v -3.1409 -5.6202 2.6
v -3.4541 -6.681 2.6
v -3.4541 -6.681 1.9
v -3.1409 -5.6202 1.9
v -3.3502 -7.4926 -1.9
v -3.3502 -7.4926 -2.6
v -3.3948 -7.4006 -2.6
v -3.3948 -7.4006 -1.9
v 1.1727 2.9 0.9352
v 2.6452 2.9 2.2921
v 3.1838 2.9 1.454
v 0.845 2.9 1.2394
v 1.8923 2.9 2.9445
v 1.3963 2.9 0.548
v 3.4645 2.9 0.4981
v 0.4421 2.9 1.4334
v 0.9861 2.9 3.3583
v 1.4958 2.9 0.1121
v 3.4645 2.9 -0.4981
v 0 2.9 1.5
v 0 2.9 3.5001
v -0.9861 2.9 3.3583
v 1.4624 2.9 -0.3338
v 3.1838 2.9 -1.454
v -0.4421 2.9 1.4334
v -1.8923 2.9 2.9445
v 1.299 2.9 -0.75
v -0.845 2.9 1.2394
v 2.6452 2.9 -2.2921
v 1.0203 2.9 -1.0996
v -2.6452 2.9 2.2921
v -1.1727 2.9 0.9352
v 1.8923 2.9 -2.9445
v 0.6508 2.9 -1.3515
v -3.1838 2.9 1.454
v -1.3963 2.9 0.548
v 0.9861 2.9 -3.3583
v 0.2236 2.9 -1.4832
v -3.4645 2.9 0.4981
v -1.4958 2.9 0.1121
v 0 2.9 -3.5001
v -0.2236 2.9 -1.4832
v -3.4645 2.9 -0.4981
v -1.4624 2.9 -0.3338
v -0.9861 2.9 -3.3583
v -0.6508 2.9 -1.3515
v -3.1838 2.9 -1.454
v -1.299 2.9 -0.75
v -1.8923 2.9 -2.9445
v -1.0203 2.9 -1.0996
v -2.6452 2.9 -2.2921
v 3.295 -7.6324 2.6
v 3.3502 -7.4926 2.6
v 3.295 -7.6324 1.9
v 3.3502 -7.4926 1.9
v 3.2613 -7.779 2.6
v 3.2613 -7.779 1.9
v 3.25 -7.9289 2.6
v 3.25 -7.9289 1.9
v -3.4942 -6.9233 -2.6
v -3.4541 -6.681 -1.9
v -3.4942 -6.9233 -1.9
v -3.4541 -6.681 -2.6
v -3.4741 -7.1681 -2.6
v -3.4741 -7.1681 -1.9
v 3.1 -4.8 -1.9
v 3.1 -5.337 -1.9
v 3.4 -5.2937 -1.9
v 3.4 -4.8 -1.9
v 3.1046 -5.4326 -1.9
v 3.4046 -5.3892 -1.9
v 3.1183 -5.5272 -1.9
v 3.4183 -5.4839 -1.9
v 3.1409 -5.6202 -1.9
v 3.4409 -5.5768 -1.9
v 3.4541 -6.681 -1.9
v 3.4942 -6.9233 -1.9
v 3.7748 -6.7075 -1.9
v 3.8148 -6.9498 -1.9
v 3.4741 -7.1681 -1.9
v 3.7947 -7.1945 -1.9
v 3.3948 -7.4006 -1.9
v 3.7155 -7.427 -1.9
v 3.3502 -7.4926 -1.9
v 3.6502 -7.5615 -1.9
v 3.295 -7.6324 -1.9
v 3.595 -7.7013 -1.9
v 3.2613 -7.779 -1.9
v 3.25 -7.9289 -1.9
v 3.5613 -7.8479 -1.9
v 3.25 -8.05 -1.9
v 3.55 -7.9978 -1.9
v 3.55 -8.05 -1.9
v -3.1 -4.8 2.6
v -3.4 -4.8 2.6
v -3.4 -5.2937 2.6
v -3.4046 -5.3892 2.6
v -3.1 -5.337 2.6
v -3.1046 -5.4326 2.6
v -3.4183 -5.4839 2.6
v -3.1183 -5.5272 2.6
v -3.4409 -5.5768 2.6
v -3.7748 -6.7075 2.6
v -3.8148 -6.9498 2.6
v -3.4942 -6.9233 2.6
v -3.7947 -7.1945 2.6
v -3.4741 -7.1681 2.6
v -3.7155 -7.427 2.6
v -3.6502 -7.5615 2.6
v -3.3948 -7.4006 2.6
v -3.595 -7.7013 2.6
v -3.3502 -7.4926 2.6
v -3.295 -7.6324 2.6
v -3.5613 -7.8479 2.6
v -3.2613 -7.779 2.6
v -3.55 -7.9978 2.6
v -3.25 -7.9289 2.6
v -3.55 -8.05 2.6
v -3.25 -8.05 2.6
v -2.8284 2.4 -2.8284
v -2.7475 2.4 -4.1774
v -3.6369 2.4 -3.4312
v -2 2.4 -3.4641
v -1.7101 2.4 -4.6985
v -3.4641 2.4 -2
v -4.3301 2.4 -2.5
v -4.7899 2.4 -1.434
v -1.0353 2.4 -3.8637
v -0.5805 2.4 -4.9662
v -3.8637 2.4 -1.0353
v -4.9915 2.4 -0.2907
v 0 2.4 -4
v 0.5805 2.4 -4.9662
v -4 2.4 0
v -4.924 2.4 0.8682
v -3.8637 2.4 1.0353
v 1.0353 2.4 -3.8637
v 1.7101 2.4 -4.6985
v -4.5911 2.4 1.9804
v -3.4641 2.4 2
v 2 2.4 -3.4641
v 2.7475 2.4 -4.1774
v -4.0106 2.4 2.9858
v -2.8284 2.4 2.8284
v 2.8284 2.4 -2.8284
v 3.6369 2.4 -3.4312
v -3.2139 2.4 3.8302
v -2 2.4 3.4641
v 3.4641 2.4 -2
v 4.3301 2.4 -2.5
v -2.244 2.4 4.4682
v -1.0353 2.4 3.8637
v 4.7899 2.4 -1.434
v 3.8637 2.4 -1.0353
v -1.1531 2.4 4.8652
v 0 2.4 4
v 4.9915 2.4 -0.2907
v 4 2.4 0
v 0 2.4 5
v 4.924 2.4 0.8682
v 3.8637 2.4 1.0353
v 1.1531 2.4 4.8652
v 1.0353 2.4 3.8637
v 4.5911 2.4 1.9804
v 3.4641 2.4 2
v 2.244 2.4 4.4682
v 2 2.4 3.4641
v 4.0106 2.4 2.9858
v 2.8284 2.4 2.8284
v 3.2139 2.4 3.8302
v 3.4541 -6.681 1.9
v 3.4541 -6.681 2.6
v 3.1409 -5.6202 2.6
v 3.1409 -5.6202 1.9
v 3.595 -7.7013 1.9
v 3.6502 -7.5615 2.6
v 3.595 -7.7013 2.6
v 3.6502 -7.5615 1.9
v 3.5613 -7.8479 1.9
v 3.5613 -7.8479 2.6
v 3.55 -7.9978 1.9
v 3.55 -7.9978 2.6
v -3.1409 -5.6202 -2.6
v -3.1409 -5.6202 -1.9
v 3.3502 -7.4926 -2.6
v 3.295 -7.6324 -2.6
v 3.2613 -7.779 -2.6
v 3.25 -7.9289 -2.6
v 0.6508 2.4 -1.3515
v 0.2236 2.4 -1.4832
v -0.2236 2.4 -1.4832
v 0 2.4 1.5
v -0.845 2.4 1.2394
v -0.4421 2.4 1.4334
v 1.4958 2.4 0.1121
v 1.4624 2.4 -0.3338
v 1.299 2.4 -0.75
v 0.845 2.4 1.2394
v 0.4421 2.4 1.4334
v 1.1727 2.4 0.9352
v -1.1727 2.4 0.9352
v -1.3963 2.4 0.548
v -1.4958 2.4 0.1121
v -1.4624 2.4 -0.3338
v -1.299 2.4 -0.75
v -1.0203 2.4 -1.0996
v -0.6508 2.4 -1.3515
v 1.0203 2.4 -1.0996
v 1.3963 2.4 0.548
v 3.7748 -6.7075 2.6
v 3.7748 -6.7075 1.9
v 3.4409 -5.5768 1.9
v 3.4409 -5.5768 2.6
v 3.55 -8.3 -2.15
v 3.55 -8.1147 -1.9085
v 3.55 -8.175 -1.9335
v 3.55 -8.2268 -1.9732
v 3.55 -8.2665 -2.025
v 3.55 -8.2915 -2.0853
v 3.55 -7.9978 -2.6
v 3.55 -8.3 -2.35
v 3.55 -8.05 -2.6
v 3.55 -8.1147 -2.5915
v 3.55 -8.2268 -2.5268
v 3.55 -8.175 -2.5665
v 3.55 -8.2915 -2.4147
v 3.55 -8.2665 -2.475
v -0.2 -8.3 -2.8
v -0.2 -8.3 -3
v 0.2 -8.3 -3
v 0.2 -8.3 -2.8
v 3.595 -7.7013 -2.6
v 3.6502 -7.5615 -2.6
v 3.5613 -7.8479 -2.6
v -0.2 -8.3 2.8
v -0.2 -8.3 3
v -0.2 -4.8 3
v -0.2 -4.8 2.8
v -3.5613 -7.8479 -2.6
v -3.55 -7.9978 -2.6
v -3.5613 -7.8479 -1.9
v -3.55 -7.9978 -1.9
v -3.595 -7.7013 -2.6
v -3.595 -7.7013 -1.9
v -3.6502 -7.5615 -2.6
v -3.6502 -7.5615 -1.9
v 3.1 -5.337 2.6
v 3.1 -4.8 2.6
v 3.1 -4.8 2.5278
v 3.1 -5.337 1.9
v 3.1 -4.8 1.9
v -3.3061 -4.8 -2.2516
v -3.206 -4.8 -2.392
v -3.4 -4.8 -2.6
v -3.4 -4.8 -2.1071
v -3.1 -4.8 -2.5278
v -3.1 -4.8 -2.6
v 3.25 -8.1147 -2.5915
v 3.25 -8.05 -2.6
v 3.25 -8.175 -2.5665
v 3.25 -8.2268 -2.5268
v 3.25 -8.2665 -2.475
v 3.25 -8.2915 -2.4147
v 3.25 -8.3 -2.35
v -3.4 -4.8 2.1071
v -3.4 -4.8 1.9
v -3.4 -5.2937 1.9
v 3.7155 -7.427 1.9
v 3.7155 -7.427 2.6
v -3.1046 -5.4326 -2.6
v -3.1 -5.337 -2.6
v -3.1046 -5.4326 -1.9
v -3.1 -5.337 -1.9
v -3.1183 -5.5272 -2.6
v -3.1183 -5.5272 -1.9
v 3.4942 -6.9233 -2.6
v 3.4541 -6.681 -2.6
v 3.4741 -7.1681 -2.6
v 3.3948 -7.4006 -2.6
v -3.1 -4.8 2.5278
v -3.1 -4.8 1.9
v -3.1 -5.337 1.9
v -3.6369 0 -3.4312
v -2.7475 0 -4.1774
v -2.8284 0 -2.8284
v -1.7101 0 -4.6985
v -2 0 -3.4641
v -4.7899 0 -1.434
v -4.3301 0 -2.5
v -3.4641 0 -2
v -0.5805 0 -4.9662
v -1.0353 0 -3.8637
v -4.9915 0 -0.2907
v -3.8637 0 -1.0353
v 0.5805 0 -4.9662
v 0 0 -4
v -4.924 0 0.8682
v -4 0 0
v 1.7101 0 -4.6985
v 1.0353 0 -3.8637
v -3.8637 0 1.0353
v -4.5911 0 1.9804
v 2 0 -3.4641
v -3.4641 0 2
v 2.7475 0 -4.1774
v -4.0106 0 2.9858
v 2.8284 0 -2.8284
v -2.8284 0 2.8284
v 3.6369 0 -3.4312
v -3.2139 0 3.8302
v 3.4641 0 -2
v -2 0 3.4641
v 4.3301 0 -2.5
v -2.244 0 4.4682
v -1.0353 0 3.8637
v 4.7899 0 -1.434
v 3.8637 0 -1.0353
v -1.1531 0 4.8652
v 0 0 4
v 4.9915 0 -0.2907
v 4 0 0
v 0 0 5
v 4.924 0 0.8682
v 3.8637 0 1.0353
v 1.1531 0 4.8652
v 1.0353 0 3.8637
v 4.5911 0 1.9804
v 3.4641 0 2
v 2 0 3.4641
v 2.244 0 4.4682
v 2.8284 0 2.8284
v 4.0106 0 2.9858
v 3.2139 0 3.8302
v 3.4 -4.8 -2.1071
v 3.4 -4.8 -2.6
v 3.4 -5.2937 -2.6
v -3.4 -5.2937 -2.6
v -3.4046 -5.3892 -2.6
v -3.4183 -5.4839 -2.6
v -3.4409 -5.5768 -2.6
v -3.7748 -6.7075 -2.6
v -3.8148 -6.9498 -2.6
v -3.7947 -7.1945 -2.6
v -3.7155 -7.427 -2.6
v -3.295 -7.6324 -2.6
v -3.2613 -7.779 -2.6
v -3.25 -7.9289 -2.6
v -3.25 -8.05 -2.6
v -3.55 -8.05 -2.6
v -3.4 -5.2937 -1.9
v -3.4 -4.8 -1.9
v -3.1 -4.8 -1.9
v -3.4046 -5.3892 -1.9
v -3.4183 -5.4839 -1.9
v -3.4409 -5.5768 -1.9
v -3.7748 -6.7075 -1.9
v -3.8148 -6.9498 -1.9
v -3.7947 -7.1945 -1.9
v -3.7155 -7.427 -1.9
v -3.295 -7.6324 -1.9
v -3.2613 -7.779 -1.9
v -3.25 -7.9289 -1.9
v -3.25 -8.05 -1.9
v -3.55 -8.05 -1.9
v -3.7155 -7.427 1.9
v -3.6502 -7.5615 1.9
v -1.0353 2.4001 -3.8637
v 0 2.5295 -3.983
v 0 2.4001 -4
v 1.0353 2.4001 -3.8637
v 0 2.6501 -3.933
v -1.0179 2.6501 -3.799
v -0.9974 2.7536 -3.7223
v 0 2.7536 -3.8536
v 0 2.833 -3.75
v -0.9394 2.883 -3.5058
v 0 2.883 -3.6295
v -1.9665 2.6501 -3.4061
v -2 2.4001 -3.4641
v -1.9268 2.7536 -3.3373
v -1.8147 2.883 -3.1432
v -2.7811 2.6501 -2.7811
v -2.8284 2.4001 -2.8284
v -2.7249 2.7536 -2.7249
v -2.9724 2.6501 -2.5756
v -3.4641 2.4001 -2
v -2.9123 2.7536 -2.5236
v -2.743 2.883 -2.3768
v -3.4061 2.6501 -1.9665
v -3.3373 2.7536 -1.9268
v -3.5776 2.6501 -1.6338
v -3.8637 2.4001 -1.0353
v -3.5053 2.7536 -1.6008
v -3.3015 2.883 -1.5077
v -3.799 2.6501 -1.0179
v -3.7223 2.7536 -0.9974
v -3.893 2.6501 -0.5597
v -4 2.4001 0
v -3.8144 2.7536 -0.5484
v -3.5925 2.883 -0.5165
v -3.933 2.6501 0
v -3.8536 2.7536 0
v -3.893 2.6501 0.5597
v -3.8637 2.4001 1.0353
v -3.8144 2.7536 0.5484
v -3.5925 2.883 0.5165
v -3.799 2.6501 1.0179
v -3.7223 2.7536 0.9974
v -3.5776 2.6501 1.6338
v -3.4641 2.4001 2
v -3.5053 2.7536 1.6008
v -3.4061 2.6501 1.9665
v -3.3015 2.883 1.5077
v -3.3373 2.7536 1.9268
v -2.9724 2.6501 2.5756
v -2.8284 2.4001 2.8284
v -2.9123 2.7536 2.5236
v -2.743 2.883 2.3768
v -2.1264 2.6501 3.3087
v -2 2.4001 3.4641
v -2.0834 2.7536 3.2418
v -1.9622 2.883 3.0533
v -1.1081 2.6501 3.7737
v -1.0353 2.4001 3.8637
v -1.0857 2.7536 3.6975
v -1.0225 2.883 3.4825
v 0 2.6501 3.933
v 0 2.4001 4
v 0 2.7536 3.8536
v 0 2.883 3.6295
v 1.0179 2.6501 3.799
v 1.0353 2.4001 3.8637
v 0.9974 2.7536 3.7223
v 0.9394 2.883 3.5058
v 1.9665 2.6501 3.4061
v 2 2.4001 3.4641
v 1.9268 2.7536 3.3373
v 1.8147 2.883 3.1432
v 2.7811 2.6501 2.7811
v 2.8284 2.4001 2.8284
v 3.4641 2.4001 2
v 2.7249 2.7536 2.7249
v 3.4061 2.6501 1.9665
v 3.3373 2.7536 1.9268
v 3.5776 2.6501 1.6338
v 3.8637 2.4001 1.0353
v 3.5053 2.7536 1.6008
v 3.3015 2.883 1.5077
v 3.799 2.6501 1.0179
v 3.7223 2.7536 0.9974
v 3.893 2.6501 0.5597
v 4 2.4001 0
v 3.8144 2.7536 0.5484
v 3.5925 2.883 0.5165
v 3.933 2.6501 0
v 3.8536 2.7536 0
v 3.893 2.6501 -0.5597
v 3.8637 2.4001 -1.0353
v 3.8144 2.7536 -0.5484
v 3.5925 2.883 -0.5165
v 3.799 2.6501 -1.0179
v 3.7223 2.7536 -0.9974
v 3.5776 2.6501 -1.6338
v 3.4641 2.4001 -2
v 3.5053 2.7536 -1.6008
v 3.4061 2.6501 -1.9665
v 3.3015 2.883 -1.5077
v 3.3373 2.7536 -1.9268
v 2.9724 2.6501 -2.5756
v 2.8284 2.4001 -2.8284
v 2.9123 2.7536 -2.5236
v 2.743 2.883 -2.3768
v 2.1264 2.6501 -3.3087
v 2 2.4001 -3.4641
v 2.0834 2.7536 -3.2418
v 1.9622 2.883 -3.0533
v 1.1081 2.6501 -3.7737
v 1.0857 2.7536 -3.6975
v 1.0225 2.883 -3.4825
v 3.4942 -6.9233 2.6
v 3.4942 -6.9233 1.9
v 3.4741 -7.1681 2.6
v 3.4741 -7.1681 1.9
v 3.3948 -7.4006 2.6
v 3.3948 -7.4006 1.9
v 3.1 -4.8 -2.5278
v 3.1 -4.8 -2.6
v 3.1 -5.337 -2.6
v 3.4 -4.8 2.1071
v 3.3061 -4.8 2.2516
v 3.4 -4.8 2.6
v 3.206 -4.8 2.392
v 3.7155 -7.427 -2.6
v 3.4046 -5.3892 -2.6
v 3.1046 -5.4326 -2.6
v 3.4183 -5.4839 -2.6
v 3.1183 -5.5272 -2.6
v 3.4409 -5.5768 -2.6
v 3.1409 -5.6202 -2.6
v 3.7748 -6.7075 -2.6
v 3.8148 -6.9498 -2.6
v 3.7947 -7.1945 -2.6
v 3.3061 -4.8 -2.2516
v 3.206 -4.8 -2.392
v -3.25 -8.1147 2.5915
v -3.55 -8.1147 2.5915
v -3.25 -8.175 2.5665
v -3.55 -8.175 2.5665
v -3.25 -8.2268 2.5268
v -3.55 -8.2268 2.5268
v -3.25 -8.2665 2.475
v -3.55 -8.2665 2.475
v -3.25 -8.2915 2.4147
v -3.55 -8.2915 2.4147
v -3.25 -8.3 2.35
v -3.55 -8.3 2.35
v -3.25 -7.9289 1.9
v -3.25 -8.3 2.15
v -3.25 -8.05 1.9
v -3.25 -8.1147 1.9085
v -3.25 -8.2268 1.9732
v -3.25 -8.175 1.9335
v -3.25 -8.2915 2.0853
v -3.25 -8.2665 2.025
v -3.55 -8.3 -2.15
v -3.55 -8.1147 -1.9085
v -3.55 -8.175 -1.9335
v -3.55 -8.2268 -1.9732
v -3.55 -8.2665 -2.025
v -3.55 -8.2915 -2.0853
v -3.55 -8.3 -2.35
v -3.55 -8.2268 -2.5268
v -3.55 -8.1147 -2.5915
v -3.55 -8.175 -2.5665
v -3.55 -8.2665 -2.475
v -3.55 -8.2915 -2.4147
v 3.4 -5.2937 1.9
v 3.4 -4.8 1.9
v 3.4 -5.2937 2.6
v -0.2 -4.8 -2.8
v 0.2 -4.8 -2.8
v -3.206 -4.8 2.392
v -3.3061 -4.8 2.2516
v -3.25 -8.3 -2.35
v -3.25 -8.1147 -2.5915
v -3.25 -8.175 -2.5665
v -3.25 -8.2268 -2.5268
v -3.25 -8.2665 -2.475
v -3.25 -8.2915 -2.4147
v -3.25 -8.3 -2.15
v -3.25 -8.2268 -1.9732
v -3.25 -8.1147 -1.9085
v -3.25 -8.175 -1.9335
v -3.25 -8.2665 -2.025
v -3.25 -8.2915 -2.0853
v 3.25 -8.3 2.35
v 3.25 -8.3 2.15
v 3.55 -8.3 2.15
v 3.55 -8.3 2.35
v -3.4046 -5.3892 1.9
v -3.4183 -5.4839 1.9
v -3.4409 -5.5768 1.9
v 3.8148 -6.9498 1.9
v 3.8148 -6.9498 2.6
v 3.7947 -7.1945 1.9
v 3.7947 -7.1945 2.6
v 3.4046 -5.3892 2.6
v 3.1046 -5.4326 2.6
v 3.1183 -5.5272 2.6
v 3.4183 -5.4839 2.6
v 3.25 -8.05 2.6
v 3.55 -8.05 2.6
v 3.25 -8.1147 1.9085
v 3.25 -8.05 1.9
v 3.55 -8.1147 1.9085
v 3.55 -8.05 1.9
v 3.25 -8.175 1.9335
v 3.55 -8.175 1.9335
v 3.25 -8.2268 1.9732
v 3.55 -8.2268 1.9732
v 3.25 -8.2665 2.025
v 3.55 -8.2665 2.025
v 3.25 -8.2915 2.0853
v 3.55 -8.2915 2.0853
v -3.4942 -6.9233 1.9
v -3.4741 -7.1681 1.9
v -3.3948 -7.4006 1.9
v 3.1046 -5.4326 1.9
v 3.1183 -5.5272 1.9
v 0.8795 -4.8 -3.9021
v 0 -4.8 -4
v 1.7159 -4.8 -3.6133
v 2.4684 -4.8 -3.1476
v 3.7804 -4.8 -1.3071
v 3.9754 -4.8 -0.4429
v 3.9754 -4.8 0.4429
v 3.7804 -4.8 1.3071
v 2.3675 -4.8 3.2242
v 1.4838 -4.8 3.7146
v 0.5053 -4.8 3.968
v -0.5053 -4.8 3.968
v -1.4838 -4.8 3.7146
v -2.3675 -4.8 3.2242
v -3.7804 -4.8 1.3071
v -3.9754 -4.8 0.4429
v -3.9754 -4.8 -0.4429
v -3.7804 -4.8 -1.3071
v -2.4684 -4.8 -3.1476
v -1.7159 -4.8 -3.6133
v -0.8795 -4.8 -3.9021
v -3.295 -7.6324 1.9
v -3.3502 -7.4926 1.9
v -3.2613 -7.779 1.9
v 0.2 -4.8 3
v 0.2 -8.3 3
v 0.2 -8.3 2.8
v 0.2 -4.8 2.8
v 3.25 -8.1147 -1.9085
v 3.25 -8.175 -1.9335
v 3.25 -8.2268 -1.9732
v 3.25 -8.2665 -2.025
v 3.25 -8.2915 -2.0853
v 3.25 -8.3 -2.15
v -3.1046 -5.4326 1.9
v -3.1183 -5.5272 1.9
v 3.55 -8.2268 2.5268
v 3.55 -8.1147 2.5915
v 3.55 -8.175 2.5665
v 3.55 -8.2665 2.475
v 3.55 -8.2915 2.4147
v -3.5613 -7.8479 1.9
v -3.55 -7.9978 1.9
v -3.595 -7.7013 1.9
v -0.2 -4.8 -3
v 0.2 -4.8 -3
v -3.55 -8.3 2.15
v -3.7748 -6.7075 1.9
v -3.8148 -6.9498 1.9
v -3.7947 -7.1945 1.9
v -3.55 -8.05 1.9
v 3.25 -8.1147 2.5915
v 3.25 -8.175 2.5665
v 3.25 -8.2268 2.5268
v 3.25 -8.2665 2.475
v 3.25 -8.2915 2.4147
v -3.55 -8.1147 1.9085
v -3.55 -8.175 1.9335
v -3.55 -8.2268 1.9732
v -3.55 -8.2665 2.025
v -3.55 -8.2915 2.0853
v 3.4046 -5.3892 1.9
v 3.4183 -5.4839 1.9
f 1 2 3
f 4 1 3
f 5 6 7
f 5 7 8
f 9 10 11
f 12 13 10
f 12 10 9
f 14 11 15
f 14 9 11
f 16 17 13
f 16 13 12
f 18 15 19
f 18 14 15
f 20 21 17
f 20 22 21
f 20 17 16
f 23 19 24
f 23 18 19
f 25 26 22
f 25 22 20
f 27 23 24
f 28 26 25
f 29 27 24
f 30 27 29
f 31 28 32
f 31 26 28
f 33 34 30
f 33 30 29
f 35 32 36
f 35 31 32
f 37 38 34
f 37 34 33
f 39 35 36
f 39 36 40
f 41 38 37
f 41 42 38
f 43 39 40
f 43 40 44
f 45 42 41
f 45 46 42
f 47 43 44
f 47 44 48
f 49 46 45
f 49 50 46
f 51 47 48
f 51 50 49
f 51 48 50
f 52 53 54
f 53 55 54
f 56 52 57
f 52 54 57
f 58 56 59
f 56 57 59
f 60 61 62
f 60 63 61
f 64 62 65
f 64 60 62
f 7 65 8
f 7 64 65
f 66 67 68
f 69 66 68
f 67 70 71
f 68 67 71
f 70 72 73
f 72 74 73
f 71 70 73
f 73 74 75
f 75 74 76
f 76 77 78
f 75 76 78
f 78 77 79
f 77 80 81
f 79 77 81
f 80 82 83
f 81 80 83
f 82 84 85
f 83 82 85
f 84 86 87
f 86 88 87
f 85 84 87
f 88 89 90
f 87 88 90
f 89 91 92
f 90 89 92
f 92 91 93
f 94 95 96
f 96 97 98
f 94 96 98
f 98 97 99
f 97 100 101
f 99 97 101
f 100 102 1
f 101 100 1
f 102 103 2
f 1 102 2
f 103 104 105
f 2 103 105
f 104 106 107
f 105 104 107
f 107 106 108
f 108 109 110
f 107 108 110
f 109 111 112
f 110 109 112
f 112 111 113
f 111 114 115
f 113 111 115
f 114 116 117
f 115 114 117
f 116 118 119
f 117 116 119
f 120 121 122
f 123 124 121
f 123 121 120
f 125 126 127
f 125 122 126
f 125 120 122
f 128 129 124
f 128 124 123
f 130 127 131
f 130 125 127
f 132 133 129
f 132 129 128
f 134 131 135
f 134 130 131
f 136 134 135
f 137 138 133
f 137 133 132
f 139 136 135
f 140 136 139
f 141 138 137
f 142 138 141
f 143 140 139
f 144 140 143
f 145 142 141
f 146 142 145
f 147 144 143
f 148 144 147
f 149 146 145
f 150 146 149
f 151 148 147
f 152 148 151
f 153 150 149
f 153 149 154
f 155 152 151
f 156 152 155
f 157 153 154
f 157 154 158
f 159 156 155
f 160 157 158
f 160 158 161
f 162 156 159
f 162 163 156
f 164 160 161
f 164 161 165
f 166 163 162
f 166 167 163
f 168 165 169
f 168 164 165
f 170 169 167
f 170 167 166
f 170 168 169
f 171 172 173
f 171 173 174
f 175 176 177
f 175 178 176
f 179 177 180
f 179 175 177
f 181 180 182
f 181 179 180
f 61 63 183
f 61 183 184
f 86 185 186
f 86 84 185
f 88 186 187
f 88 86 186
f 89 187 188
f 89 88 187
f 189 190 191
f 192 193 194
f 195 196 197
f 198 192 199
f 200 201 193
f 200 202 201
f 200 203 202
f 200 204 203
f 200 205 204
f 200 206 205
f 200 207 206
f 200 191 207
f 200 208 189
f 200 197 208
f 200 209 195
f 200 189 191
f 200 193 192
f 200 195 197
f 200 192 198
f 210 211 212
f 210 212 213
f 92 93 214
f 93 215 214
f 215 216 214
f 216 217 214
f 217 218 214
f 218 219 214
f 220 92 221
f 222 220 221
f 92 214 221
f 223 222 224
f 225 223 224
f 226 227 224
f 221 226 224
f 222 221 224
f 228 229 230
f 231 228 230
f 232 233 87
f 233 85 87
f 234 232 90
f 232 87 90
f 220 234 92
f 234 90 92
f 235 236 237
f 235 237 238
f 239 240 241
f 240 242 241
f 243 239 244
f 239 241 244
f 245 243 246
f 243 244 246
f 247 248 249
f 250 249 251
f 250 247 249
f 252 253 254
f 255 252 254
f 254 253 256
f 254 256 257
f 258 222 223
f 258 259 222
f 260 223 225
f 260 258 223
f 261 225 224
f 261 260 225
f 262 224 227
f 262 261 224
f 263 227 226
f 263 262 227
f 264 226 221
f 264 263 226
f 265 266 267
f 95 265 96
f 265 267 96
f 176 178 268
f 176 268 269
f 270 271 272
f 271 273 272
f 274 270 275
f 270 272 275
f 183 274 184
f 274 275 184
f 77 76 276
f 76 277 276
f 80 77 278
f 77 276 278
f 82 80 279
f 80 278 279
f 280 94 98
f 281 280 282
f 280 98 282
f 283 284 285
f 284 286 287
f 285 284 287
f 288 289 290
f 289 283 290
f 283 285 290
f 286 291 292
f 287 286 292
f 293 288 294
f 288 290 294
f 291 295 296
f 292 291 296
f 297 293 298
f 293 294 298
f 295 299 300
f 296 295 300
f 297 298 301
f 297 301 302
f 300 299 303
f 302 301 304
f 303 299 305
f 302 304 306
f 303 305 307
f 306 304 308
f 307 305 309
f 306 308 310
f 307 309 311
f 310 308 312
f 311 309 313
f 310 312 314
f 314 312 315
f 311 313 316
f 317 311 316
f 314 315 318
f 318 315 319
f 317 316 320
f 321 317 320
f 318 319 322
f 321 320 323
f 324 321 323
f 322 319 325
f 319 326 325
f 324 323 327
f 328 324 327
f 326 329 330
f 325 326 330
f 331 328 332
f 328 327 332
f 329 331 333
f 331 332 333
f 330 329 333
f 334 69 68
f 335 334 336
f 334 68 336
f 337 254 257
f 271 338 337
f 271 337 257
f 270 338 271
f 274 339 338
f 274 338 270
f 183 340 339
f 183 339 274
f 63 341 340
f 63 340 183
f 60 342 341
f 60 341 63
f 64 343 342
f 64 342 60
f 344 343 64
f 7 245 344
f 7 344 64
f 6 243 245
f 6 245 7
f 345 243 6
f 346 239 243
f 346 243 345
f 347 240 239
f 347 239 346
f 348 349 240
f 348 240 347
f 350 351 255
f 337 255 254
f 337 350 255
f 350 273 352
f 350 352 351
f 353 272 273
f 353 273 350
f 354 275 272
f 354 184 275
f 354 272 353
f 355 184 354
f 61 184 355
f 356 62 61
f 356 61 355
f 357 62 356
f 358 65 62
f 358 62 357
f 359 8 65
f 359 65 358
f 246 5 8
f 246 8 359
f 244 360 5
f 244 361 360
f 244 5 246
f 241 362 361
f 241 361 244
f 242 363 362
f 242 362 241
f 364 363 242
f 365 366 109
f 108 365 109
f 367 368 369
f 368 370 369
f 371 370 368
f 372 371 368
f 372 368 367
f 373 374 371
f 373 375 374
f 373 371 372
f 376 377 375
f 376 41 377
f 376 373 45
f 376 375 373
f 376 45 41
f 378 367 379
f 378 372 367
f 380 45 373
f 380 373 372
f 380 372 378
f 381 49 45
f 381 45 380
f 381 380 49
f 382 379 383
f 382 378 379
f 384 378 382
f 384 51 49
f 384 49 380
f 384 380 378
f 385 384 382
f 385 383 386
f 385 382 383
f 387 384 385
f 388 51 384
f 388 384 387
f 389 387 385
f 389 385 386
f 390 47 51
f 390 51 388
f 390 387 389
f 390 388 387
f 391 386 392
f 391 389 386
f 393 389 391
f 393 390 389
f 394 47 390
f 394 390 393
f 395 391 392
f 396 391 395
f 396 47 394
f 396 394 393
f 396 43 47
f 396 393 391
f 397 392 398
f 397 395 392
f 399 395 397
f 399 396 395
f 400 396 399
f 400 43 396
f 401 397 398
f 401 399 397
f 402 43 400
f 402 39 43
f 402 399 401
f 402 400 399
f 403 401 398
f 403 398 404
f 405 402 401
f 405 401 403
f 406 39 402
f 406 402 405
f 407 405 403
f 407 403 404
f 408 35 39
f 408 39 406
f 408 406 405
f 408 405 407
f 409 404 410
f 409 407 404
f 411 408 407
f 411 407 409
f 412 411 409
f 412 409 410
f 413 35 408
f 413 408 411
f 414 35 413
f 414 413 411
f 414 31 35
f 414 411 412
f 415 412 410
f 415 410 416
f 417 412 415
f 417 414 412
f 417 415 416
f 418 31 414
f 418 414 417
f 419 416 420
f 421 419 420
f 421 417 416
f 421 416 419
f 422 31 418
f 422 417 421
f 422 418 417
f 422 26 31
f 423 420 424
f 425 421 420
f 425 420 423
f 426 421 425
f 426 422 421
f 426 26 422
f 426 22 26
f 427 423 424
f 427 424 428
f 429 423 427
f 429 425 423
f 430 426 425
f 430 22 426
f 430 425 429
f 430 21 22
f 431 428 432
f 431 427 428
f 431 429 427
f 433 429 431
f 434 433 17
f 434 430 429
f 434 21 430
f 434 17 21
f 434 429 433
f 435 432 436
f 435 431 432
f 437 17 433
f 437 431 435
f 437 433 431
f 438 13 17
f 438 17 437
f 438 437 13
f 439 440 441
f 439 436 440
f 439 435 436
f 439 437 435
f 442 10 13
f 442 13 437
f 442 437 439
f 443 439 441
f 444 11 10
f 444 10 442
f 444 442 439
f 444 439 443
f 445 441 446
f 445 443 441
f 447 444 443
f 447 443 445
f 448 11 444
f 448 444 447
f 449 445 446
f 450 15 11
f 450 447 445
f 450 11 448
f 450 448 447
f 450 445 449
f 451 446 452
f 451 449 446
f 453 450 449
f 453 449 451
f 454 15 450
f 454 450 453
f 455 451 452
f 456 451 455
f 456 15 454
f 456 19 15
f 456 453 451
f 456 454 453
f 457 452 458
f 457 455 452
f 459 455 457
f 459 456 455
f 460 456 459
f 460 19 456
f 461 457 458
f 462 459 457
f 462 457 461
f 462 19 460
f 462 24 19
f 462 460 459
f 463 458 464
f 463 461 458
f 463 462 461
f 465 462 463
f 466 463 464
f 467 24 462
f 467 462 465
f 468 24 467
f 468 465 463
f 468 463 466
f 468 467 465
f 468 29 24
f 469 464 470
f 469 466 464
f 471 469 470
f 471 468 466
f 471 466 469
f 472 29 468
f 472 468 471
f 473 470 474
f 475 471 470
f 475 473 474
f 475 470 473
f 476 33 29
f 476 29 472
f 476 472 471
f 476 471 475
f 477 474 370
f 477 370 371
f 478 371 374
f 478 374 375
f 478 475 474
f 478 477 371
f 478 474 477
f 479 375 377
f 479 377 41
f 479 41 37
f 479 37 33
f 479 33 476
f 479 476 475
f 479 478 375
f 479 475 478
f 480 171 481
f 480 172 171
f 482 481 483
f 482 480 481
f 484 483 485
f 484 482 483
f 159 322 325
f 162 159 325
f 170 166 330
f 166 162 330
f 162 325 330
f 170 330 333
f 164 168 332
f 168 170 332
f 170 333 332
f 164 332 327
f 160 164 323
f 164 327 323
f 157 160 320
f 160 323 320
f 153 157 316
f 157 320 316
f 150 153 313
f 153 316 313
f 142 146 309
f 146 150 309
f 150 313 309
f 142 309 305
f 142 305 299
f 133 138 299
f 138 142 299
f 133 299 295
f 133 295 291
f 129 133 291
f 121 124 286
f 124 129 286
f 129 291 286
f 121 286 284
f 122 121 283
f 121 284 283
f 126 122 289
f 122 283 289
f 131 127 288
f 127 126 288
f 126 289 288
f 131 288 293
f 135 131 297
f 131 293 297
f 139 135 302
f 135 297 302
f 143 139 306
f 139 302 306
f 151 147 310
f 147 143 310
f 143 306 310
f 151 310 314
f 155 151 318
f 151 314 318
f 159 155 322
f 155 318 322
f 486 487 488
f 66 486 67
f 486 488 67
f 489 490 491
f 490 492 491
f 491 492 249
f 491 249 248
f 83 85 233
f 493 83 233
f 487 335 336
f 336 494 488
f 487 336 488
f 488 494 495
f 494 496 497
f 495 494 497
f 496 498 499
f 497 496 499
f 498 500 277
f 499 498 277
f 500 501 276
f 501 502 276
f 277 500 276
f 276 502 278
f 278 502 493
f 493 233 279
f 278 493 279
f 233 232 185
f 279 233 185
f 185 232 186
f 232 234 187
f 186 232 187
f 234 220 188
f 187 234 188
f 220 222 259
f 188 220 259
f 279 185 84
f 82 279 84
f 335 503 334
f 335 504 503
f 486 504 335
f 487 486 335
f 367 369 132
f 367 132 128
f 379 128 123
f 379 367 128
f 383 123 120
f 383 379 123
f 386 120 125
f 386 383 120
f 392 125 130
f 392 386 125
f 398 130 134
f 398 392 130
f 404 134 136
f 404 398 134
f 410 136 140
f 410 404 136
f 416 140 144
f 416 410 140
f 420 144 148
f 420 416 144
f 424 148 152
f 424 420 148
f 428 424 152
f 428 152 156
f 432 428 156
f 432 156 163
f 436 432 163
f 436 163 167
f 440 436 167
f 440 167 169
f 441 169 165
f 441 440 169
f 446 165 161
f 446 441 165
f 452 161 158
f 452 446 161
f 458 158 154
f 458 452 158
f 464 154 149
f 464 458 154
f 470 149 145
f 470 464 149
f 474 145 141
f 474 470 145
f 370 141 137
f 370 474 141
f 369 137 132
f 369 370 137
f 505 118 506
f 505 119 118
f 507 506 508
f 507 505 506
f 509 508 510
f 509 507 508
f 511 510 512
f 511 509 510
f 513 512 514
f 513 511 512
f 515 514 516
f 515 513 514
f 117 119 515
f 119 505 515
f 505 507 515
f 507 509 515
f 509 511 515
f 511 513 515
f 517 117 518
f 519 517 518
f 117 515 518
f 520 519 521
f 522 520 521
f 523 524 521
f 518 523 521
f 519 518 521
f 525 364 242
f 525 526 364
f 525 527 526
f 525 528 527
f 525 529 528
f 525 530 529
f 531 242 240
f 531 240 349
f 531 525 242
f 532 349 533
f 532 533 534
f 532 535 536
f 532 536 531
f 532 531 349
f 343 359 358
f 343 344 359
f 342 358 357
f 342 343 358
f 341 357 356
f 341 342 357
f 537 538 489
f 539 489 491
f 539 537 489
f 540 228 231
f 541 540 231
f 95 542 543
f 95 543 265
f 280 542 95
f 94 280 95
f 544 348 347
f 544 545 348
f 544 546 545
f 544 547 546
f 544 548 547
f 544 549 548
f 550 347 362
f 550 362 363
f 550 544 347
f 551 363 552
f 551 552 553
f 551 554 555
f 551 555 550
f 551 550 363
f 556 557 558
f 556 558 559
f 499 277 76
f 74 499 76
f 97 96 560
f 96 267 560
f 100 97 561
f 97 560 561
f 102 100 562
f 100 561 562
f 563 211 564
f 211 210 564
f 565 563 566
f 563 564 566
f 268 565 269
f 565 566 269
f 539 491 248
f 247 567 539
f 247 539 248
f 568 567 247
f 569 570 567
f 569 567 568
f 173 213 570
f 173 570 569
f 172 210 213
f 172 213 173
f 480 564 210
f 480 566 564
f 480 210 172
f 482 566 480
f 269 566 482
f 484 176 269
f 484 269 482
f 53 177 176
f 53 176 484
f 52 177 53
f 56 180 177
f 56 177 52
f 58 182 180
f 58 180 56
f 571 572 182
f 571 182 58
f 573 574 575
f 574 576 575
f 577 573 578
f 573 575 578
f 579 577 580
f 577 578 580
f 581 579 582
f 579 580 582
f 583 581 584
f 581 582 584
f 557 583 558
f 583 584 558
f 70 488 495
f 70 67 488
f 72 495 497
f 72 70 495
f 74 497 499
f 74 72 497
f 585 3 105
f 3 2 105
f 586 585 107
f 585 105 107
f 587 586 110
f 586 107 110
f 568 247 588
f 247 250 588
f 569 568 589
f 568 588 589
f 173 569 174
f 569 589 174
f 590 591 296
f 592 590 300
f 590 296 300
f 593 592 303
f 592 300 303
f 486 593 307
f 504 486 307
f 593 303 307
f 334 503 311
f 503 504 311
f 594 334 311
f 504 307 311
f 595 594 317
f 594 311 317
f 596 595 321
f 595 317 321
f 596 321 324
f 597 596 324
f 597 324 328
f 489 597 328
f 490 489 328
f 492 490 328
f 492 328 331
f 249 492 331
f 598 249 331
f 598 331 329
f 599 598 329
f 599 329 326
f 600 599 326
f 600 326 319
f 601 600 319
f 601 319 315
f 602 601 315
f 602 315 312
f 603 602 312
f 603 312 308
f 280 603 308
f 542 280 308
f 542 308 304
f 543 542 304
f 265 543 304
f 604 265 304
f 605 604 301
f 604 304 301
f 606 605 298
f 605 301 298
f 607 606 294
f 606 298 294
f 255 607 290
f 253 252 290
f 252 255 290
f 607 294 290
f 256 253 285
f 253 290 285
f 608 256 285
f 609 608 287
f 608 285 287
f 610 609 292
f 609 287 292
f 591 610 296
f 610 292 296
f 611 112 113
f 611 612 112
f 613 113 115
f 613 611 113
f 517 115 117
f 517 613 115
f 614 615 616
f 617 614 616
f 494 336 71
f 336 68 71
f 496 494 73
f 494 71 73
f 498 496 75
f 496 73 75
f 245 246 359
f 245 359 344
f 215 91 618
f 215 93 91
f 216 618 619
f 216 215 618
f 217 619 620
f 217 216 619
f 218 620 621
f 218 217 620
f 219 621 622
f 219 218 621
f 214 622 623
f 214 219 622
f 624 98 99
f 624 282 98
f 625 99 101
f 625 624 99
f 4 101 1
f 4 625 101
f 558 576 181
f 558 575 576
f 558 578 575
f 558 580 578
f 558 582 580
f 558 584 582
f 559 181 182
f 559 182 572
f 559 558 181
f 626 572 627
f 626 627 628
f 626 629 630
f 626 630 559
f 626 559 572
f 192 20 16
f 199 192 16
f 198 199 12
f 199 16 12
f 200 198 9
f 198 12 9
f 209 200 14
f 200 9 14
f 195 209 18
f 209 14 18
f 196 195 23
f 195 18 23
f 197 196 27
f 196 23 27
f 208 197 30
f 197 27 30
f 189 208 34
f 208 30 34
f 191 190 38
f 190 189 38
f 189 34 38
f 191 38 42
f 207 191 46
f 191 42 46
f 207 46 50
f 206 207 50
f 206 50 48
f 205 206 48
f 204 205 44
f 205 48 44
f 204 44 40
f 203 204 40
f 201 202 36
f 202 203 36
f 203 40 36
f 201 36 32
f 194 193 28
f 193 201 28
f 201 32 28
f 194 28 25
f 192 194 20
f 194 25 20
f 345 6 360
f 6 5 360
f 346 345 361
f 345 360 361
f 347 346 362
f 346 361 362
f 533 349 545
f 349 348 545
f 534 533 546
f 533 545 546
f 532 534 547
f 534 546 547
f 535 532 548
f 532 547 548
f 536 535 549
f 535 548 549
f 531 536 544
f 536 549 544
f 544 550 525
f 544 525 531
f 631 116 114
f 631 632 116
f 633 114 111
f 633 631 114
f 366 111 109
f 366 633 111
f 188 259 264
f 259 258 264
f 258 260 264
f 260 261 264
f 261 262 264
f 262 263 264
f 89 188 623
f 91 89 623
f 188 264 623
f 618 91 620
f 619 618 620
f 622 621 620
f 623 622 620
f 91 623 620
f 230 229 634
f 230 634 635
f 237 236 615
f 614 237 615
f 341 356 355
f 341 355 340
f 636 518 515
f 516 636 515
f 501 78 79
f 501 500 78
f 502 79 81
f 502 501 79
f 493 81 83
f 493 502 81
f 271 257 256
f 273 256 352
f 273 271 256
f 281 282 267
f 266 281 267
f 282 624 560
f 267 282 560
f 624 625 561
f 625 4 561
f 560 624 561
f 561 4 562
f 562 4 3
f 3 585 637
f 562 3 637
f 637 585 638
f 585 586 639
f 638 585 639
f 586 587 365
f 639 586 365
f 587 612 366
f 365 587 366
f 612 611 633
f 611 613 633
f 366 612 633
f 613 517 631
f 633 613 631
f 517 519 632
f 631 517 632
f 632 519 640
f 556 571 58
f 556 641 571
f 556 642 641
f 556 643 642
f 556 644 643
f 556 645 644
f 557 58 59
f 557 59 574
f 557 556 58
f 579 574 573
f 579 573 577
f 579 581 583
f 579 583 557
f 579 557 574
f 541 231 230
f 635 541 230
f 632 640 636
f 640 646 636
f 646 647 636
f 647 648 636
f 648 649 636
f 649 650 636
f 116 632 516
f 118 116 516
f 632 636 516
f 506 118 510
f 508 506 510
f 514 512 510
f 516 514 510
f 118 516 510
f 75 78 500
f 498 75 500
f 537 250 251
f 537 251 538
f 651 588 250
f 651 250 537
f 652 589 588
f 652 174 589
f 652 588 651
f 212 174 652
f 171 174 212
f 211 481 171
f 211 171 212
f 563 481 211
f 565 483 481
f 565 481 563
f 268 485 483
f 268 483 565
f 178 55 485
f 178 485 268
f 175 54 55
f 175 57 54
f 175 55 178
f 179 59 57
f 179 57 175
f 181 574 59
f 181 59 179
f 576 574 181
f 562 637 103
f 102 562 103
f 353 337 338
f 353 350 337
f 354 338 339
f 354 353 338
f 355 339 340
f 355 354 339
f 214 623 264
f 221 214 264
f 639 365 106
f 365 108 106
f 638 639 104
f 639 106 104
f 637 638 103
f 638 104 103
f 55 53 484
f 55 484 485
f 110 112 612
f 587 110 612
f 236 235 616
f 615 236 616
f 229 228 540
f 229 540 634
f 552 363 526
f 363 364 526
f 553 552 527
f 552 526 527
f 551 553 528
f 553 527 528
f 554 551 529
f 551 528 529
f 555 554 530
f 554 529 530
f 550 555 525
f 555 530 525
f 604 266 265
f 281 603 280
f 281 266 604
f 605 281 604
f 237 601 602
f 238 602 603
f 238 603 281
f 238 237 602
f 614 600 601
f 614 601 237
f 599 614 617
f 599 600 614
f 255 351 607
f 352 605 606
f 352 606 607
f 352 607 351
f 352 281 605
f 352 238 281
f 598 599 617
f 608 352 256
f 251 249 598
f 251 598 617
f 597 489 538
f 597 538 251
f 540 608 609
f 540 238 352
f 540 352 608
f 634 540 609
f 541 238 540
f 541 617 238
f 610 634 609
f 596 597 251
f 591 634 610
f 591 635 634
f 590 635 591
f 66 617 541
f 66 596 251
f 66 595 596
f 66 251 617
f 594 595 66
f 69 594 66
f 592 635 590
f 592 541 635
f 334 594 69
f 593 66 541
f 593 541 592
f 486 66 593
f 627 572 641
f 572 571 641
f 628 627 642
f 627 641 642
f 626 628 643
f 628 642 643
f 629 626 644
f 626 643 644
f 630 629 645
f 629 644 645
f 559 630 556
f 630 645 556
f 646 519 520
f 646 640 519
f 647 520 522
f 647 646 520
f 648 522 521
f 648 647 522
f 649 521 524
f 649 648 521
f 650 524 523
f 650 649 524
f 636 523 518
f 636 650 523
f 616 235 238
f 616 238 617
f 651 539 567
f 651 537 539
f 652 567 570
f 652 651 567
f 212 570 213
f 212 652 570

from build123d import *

# Parameters (mm, degrees)
SKETCH_1_R             = 5
EXTRUDE_1_DEPTH        = 2.4
SKETCH_2_R             = 4
EXTRUDE_2_DEPTH        = 4.8
EXTRUDE_START          = 0.5
SKETCH_3_R             = 4
EXTRUDE_3_DEPTH        = 0.5
FILLET_1_R             = 0.5
SKETCH_5_R             = 1.5
CUT_EXTRUDE_1_DEPTH    = 0.5
SKETCH_6_W             = 0.3
SKETCH_6_H             = 0.7
SKETCH_8_W             = 0.4
SKETCH_8_H             = 0.2
EXTRUDE_5_DEPTH        = 3.5
FILLET_2_R             = 1
FILLET_3_R             = 0.25
FILLET_2_OF_MIRROR_2_R = 1
FILLET_3_OF_MIRROR_2_R = 0.25


# Read off the part's stored shape, not the designer's step: Зеркальное отражение3
with BuildPart() as part:
    # Эскиз1 → Бобышка-Вытянуть1 (new body)
    with BuildSketch(Plane(origin=(0, 0, 0), x_dir=(1, 0, 0), z_dir=(0, 1, 0))):
        with Locations(Location((0, 0, 0), (0, 0, 270))):
            Circle(SKETCH_1_R)
    extrude(amount=EXTRUDE_1_DEPTH)

    # Эскиз2 → Бобышка-Вытянуть2 (add)
    with BuildSketch(Plane.XZ):
        with Locations(Location((0, 0, 0), (0, 0, 270))):
            Circle(SKETCH_2_R)
    extrude(amount=EXTRUDE_2_DEPTH)

    # Эскиз3 → Бобышка-Вытянуть3 (add)
    with BuildSketch(Plane(origin=(0, 2.4, 0), x_dir=(1, 0, 0), z_dir=(0, 1, 0)).offset(EXTRUDE_START)):
        with Locations(Location((0, 0, 0), (0, 0, 90))):
            Circle(SKETCH_3_R)
    extrude(amount=-EXTRUDE_3_DEPTH)

    # Скругление1
    fillet_1_edges = [part.edges().sort_by_distance(p)[0] for p in [
        (0, 2.9, 4),
    ]]
    fillet(fillet_1_edges, radius=FILLET_1_R - 0.0001)  # a hair under: the kernel refuses the full size

    # Эскиз5 → Вырез-Вытянуть1 (cut)
    with BuildSketch(Plane(origin=(0, 2.9, 0), x_dir=(1, 0, 0), z_dir=(0, 1, 0))):
        with Locations(Location((0, 0, 0), (0, 0, 270))):
            Circle(SKETCH_5_R)
    extrude(amount=-CUT_EXTRUDE_1_DEPTH, mode=Mode.SUBTRACT)

    # По траектории4: sweep along a curve in space
    with BuildLine() as sweep_4_path:
        Line((-3.25, -4.8, 2.25), (-3.25, -5.459878122, 2.25))
        Line((-3.25, -5.459878122, 2.25), (-3.724056905, -7.065490817, 2.25))
        Line((-3.724056905, -7.065490817, 2.25), (-3.4, -7.733693766, 2.25))
        Line((-3.4, -7.733693766, 2.25), (-3.4, -8.3, 2.25))
    # Эскиз6 → По траектории4 (sweep)
    with BuildSketch(Plane(origin=(0, -4.8, -4.8), x_dir=(-1, 0, 0), z_dir=(0, 1, 0))):
        with Locations((3.25, 7.05)):
            Rectangle(SKETCH_6_W, SKETCH_6_H)
    sweep_4 = sweep(path=sweep_4_path.line, transition=Transition.RIGHT)

    # Эскиз8 → Бобышка-Вытянуть5 (add)
    with BuildSketch(Plane(origin=(0, -4.8, 9.6), x_dir=(1, 0, 0), z_dir=(0, 1, 0))):
        with Locations((0, 12.5)):
            Rectangle(SKETCH_8_W, SKETCH_8_H)
        with Locations((0, 6.7)):
            Rectangle(SKETCH_8_W, SKETCH_8_H)
    extrude(amount=-EXTRUDE_5_DEPTH)

    # Скругление2
    fillet_2_edges = [part.edges().sort_by_distance(p)[0] for p in [
        (-3.25, -7.699240124, 2.25),
        (-3.55, -7.768147407, 2.25),
        (-3.884358836, -7.078701954, 2.25),
        (-3.563754975, -7.052279681, 2.25),
        (-3.4, -5.438197011, 2.25),
        (-3.1, -5.481559233, 2.25),
    ]]
    fillet(fillet_2_edges, radius=FILLET_2_R)

    # Скругление3
    fillet_3_edges = [part.edges().sort_by_distance(p)[0] for p in [
        (-3.4, -8.3, 1.9),
        (-3.4, -8.3, 2.6),
    ]]
    fillet(fillet_3_edges, radius=FILLET_3_R)

    # Зеркальное отражение2: По траектории4 across plane
    add(sweep_4.mirror(Plane(origin=(0, 0, 0), x_dir=(0, 0, 1), z_dir=(1, 0, 0))))

    # Скругление2 of Зеркальное отражение2
    fillet_2_of_mirror_2_edges = [part.edges().sort_by_distance(p)[0] for p in [
        (3.25, -7.699240124, 2.25),
        (3.55, -7.768147407, 2.25),
        (3.884358836, -7.078701954, 2.25),
        (3.563754975, -7.052279681, 2.25),
        (3.4, -5.438197011, 2.25),
        (3.1, -5.481559233, 2.25),
    ]]
    fillet(fillet_2_of_mirror_2_edges, radius=FILLET_2_OF_MIRROR_2_R)

    # Скругление3 of Зеркальное отражение2
    fillet_3_of_mirror_2_edges = [part.edges().sort_by_distance(p)[0] for p in [
        (3.4, -8.3, 1.9),
        (3.4, -8.3, 2.6),
    ]]
    fillet(fillet_3_of_mirror_2_edges, radius=FILLET_3_OF_MIRROR_2_R)

    # Зеркальное отражение3: part across plane


with BuildPart() as part_1:
    add(part.part)
    add(part.part.mirror(Plane.XY))


solid = part_1.part
